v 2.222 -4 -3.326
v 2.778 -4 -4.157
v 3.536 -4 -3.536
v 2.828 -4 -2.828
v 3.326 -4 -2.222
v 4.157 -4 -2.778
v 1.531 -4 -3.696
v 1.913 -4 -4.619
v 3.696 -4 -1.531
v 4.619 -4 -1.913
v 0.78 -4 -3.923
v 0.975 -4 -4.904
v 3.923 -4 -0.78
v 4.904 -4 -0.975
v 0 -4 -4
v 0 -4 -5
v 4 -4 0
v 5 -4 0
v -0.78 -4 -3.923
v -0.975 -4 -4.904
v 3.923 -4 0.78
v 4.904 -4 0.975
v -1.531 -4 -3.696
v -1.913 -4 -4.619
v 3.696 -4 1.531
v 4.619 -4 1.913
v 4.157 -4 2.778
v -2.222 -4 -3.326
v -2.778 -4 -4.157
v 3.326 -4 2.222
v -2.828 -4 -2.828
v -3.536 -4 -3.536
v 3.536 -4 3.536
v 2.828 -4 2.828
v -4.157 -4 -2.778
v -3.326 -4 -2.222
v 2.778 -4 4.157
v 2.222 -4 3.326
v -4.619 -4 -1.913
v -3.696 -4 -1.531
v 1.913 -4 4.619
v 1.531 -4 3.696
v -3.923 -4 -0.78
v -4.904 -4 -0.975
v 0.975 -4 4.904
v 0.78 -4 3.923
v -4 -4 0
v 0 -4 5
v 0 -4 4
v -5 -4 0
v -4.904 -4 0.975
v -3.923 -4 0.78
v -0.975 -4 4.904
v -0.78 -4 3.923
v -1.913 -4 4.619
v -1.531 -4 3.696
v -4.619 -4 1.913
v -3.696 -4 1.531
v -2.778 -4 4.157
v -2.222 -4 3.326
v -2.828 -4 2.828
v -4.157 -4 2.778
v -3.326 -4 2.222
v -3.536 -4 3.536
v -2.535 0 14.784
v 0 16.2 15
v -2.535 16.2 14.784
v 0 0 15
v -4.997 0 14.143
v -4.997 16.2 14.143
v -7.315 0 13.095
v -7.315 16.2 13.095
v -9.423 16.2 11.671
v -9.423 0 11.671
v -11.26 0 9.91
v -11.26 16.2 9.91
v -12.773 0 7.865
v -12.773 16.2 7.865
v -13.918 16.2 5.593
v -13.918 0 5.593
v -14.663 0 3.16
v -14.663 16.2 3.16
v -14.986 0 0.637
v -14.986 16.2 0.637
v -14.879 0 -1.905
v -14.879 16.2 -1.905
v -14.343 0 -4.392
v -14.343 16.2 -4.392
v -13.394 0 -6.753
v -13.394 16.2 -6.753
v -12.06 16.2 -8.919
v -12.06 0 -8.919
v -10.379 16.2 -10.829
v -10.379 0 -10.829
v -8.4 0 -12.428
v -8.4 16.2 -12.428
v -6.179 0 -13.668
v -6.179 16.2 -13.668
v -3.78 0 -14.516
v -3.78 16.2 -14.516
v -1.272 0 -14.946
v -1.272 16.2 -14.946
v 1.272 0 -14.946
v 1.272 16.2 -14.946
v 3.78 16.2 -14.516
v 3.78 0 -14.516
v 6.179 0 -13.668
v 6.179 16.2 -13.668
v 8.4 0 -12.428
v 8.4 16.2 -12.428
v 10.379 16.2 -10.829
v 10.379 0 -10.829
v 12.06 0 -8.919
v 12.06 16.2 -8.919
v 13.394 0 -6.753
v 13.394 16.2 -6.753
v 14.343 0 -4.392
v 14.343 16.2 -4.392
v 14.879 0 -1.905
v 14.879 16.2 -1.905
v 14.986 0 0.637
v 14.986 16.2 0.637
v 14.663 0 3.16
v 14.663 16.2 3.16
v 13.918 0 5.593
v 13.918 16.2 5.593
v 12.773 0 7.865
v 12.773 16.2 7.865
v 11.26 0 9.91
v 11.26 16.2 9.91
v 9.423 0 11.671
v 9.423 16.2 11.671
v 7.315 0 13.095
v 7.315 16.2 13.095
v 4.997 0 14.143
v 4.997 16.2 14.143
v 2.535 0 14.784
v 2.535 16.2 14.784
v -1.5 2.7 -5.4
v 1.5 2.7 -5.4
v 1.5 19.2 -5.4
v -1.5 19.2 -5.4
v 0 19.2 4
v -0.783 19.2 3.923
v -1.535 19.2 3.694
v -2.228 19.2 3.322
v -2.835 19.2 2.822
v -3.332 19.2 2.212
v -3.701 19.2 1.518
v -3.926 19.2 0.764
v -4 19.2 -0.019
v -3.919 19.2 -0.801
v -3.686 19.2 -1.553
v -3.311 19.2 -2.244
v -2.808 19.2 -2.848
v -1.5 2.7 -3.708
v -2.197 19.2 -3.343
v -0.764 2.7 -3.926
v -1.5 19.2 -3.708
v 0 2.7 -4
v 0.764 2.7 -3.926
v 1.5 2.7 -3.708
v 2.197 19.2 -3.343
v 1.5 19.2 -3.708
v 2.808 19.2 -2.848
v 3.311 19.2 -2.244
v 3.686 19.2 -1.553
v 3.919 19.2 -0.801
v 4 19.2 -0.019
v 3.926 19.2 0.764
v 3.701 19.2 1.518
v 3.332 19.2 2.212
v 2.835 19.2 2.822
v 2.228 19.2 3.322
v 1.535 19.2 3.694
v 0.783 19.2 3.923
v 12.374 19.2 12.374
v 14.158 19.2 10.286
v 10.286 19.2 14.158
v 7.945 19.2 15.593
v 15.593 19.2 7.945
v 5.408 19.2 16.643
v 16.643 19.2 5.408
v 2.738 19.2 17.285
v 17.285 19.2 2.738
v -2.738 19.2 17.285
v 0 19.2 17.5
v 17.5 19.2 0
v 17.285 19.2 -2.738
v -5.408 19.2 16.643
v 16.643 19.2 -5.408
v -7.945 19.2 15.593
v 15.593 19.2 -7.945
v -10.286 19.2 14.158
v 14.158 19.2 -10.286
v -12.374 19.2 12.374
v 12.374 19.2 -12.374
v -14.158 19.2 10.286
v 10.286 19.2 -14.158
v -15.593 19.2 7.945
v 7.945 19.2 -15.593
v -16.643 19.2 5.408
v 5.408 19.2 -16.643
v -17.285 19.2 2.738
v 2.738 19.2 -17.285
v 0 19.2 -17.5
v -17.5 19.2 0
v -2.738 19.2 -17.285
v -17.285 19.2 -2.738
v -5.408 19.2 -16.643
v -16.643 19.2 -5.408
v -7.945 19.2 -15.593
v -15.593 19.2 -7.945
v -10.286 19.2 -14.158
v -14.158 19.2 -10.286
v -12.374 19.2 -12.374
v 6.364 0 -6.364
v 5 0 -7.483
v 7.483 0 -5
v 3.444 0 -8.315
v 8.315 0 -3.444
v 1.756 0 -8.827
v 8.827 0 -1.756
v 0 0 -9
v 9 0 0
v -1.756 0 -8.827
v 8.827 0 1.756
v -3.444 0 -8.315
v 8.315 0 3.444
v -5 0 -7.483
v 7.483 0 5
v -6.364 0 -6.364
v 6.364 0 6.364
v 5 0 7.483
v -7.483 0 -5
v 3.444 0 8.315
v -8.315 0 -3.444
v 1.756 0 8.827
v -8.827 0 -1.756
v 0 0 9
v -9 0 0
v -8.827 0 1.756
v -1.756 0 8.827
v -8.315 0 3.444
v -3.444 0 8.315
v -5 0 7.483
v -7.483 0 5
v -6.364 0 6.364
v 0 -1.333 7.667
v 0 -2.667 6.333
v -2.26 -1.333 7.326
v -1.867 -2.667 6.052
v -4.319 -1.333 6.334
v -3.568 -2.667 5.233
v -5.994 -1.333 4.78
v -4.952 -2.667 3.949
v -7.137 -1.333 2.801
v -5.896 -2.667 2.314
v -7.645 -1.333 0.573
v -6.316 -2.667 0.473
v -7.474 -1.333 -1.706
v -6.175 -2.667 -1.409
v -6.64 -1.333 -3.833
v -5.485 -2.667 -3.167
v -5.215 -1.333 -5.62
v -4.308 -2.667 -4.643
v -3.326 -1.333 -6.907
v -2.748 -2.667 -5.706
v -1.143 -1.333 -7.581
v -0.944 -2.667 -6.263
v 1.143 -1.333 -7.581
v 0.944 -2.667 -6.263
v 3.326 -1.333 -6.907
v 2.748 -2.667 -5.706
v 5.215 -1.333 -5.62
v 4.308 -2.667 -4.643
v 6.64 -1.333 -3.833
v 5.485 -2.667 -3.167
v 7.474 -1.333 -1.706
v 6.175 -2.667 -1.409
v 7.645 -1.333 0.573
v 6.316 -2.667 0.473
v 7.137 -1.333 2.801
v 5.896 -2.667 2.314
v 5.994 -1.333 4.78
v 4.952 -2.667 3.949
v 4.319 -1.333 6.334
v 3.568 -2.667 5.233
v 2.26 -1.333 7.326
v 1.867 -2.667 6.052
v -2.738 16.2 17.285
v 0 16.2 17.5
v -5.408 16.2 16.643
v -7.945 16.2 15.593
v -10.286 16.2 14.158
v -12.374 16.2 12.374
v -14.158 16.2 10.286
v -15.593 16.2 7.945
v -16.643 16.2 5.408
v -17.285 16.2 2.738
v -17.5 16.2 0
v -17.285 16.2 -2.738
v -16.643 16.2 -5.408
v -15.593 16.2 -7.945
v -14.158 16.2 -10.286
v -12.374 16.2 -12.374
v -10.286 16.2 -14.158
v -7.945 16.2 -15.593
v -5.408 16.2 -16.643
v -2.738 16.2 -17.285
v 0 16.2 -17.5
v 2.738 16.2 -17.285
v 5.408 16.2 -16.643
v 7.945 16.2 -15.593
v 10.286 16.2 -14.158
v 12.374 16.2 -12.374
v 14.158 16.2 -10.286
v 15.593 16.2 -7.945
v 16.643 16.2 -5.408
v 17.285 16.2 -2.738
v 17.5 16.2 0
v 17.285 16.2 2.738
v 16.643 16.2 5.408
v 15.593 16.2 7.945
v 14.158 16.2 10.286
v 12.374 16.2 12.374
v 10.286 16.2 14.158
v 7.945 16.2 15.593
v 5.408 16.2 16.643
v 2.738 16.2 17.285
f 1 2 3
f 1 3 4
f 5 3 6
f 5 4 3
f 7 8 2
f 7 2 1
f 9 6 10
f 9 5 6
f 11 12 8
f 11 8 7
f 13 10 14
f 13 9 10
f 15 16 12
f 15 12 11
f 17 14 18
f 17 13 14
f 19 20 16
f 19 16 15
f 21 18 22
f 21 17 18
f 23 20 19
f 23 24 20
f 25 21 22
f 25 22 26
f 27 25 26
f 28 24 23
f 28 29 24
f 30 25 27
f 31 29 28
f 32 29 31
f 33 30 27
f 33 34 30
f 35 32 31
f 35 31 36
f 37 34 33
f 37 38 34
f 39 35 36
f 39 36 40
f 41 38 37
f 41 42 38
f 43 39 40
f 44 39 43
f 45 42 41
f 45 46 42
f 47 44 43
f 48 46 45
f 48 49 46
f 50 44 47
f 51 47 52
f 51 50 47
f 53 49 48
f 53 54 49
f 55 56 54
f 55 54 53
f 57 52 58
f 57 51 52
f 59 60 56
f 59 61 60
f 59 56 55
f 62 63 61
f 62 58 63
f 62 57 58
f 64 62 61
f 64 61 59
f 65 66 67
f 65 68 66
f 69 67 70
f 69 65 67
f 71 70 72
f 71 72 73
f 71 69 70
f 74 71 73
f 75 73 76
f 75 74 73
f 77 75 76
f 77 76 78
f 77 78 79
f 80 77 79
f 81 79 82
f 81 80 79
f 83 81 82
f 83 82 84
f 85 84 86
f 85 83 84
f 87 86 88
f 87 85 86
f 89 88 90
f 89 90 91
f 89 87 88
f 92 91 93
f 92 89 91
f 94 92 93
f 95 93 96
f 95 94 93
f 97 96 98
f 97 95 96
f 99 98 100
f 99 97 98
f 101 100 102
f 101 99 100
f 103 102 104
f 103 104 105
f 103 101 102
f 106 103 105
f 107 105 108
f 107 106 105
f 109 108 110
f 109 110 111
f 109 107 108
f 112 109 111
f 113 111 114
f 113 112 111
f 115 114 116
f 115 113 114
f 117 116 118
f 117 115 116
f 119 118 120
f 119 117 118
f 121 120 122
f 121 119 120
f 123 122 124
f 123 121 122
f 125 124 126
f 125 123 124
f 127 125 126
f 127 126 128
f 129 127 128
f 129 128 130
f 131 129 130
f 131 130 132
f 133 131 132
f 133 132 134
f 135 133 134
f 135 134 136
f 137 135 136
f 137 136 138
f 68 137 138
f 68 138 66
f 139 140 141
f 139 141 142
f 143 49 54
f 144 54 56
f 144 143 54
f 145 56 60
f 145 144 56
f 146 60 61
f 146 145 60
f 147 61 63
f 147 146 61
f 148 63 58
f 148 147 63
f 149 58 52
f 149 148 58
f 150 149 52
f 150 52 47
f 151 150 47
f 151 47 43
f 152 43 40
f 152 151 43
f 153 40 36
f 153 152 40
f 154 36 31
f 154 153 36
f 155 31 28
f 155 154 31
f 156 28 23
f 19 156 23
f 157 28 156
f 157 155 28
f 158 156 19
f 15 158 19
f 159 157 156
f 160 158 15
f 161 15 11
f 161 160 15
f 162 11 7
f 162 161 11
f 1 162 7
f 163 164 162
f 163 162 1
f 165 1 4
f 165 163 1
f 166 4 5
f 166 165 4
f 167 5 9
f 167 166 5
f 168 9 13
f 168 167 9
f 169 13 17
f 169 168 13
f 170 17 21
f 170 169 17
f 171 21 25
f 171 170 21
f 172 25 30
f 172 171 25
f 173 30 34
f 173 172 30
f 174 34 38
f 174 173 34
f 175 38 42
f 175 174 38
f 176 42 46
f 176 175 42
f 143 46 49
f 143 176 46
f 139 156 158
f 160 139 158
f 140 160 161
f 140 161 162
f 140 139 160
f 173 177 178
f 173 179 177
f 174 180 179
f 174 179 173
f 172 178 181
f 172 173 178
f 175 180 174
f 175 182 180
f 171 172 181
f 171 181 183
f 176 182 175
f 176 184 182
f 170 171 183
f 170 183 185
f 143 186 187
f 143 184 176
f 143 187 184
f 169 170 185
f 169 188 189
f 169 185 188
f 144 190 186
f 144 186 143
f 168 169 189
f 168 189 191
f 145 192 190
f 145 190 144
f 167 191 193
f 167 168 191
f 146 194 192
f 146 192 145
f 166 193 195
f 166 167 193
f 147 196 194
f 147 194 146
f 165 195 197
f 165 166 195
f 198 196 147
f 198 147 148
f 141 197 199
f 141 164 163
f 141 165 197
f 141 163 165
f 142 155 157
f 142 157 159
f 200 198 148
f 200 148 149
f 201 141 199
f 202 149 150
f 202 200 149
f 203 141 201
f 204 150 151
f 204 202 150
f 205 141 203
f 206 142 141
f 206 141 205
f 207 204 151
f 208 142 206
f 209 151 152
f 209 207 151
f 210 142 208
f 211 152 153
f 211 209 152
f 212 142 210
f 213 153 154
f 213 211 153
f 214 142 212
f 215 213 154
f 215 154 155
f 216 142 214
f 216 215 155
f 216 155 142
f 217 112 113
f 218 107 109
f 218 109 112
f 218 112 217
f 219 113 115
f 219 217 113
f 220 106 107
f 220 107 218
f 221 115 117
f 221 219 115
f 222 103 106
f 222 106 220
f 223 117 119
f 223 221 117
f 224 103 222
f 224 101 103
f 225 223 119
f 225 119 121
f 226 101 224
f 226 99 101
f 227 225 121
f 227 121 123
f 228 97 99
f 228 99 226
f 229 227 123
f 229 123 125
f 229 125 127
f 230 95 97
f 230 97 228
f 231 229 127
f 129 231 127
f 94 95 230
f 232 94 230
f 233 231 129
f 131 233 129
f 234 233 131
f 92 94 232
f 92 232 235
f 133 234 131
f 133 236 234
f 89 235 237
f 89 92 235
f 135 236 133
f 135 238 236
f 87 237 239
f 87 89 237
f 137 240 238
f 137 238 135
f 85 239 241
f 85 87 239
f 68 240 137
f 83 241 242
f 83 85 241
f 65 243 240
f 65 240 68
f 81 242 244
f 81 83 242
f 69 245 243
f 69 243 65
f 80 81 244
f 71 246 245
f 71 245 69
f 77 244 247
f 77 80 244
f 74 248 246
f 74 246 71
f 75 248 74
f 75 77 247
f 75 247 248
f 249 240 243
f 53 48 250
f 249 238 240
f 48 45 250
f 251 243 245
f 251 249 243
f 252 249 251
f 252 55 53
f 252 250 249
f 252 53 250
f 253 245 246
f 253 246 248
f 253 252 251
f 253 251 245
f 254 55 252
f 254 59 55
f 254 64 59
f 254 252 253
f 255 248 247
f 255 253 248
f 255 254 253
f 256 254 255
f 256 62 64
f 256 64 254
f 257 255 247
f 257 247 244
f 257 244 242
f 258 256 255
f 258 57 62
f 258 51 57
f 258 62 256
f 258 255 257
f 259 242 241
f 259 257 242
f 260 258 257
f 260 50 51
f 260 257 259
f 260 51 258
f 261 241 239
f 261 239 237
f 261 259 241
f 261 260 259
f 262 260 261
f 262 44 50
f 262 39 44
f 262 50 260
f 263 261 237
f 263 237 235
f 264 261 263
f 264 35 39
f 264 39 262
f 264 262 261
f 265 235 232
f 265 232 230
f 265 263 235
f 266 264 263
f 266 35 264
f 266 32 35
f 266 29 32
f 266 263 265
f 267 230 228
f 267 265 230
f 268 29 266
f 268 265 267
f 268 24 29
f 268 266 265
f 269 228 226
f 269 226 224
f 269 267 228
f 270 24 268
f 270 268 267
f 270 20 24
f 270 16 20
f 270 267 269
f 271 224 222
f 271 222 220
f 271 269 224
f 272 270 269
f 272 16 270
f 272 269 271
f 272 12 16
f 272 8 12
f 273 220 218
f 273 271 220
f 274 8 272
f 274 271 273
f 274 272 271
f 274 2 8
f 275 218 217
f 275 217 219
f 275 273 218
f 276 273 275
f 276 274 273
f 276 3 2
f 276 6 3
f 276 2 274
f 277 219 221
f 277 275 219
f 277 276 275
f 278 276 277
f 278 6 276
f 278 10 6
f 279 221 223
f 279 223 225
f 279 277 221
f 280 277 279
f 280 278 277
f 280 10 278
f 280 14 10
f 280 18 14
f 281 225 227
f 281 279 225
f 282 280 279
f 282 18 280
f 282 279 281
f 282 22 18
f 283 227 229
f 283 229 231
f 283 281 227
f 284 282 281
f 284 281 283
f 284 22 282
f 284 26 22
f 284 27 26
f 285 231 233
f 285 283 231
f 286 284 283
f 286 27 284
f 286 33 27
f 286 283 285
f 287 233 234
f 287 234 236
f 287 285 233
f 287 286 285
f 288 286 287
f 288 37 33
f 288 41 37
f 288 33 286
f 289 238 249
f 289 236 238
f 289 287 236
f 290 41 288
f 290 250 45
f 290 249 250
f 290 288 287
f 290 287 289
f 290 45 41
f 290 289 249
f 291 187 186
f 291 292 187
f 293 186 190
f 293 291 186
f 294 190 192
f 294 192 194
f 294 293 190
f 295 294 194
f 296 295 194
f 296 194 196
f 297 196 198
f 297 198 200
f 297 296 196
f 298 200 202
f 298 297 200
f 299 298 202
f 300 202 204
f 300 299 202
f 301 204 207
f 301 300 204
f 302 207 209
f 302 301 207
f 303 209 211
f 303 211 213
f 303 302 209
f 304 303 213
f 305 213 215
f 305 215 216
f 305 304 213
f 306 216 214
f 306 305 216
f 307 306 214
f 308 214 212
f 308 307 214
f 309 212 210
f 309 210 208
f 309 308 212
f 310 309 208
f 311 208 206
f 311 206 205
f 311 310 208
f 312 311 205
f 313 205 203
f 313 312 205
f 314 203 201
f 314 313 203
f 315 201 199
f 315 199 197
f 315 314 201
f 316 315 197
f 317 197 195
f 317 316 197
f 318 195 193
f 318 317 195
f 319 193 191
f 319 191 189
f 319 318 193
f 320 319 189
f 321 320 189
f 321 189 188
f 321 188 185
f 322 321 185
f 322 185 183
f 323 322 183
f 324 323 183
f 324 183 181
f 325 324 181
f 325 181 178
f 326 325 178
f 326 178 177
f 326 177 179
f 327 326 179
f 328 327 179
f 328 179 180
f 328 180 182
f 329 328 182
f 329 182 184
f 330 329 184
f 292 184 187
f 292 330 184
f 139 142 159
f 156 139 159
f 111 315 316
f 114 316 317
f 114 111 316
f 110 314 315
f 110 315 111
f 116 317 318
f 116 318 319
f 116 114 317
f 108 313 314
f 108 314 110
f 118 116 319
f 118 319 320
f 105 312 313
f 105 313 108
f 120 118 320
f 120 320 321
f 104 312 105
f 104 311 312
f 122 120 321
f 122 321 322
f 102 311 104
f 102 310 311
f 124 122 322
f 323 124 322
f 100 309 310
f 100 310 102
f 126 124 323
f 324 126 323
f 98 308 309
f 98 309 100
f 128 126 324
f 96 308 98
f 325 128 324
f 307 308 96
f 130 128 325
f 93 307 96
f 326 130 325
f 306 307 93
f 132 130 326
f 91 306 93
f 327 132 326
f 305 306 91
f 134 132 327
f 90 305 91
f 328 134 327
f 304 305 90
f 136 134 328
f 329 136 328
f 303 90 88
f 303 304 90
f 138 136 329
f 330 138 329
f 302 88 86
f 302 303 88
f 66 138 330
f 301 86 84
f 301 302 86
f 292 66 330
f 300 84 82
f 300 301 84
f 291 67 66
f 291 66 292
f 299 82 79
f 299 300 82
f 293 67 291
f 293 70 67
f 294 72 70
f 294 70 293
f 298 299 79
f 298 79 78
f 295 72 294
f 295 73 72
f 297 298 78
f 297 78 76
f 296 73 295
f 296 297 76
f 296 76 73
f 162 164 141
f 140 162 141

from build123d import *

# Parameters (mm, degrees)
ENL_V_MAT_EXTRU_1_DEPTH = 16.5


with BuildPart() as part:
    # Sketch1 → Revolve1 (revolve)
    with BuildSketch(Plane.XY, mode=Mode.PRIVATE) as revolve1_sk:
        Polygon((4, 19.2), (17.5, 19.2), (17.5, 16.2), (15, 16.2), (15, 0), (9, 0), (5, -4), (4, -4), align=None)
    revolve(revolve1_sk.sketch.rotate(Axis((0, 12.709342281, 0), (0, -1, 0)), 90), axis=Axis((0, 12.709342281, 0), (0, -1, 0)))

    # Esquisse1 → Enlèv. mat.-Extru.1 (cut)
    with BuildSketch(Plane(origin=(0, 19.2, 0), x_dir=(1, 0, 0), z_dir=(0, 1, 0))):
        with BuildLine():
            Line((-1.5, 5.4), (-1.5, 3.708099244))
            ThreePointArc((-1.5, 3.708099244), (0, 4), (1.5, 3.708099244))
            Line((1.5, 3.708099244), (1.5, 5.4))
            Line((1.5, 5.4), (-1.5, 5.4))
        make_face()
    extrude(amount=-ENL_V_MAT_EXTRU_1_DEPTH, mode=Mode.SUBTRACT)


solid = part.part
